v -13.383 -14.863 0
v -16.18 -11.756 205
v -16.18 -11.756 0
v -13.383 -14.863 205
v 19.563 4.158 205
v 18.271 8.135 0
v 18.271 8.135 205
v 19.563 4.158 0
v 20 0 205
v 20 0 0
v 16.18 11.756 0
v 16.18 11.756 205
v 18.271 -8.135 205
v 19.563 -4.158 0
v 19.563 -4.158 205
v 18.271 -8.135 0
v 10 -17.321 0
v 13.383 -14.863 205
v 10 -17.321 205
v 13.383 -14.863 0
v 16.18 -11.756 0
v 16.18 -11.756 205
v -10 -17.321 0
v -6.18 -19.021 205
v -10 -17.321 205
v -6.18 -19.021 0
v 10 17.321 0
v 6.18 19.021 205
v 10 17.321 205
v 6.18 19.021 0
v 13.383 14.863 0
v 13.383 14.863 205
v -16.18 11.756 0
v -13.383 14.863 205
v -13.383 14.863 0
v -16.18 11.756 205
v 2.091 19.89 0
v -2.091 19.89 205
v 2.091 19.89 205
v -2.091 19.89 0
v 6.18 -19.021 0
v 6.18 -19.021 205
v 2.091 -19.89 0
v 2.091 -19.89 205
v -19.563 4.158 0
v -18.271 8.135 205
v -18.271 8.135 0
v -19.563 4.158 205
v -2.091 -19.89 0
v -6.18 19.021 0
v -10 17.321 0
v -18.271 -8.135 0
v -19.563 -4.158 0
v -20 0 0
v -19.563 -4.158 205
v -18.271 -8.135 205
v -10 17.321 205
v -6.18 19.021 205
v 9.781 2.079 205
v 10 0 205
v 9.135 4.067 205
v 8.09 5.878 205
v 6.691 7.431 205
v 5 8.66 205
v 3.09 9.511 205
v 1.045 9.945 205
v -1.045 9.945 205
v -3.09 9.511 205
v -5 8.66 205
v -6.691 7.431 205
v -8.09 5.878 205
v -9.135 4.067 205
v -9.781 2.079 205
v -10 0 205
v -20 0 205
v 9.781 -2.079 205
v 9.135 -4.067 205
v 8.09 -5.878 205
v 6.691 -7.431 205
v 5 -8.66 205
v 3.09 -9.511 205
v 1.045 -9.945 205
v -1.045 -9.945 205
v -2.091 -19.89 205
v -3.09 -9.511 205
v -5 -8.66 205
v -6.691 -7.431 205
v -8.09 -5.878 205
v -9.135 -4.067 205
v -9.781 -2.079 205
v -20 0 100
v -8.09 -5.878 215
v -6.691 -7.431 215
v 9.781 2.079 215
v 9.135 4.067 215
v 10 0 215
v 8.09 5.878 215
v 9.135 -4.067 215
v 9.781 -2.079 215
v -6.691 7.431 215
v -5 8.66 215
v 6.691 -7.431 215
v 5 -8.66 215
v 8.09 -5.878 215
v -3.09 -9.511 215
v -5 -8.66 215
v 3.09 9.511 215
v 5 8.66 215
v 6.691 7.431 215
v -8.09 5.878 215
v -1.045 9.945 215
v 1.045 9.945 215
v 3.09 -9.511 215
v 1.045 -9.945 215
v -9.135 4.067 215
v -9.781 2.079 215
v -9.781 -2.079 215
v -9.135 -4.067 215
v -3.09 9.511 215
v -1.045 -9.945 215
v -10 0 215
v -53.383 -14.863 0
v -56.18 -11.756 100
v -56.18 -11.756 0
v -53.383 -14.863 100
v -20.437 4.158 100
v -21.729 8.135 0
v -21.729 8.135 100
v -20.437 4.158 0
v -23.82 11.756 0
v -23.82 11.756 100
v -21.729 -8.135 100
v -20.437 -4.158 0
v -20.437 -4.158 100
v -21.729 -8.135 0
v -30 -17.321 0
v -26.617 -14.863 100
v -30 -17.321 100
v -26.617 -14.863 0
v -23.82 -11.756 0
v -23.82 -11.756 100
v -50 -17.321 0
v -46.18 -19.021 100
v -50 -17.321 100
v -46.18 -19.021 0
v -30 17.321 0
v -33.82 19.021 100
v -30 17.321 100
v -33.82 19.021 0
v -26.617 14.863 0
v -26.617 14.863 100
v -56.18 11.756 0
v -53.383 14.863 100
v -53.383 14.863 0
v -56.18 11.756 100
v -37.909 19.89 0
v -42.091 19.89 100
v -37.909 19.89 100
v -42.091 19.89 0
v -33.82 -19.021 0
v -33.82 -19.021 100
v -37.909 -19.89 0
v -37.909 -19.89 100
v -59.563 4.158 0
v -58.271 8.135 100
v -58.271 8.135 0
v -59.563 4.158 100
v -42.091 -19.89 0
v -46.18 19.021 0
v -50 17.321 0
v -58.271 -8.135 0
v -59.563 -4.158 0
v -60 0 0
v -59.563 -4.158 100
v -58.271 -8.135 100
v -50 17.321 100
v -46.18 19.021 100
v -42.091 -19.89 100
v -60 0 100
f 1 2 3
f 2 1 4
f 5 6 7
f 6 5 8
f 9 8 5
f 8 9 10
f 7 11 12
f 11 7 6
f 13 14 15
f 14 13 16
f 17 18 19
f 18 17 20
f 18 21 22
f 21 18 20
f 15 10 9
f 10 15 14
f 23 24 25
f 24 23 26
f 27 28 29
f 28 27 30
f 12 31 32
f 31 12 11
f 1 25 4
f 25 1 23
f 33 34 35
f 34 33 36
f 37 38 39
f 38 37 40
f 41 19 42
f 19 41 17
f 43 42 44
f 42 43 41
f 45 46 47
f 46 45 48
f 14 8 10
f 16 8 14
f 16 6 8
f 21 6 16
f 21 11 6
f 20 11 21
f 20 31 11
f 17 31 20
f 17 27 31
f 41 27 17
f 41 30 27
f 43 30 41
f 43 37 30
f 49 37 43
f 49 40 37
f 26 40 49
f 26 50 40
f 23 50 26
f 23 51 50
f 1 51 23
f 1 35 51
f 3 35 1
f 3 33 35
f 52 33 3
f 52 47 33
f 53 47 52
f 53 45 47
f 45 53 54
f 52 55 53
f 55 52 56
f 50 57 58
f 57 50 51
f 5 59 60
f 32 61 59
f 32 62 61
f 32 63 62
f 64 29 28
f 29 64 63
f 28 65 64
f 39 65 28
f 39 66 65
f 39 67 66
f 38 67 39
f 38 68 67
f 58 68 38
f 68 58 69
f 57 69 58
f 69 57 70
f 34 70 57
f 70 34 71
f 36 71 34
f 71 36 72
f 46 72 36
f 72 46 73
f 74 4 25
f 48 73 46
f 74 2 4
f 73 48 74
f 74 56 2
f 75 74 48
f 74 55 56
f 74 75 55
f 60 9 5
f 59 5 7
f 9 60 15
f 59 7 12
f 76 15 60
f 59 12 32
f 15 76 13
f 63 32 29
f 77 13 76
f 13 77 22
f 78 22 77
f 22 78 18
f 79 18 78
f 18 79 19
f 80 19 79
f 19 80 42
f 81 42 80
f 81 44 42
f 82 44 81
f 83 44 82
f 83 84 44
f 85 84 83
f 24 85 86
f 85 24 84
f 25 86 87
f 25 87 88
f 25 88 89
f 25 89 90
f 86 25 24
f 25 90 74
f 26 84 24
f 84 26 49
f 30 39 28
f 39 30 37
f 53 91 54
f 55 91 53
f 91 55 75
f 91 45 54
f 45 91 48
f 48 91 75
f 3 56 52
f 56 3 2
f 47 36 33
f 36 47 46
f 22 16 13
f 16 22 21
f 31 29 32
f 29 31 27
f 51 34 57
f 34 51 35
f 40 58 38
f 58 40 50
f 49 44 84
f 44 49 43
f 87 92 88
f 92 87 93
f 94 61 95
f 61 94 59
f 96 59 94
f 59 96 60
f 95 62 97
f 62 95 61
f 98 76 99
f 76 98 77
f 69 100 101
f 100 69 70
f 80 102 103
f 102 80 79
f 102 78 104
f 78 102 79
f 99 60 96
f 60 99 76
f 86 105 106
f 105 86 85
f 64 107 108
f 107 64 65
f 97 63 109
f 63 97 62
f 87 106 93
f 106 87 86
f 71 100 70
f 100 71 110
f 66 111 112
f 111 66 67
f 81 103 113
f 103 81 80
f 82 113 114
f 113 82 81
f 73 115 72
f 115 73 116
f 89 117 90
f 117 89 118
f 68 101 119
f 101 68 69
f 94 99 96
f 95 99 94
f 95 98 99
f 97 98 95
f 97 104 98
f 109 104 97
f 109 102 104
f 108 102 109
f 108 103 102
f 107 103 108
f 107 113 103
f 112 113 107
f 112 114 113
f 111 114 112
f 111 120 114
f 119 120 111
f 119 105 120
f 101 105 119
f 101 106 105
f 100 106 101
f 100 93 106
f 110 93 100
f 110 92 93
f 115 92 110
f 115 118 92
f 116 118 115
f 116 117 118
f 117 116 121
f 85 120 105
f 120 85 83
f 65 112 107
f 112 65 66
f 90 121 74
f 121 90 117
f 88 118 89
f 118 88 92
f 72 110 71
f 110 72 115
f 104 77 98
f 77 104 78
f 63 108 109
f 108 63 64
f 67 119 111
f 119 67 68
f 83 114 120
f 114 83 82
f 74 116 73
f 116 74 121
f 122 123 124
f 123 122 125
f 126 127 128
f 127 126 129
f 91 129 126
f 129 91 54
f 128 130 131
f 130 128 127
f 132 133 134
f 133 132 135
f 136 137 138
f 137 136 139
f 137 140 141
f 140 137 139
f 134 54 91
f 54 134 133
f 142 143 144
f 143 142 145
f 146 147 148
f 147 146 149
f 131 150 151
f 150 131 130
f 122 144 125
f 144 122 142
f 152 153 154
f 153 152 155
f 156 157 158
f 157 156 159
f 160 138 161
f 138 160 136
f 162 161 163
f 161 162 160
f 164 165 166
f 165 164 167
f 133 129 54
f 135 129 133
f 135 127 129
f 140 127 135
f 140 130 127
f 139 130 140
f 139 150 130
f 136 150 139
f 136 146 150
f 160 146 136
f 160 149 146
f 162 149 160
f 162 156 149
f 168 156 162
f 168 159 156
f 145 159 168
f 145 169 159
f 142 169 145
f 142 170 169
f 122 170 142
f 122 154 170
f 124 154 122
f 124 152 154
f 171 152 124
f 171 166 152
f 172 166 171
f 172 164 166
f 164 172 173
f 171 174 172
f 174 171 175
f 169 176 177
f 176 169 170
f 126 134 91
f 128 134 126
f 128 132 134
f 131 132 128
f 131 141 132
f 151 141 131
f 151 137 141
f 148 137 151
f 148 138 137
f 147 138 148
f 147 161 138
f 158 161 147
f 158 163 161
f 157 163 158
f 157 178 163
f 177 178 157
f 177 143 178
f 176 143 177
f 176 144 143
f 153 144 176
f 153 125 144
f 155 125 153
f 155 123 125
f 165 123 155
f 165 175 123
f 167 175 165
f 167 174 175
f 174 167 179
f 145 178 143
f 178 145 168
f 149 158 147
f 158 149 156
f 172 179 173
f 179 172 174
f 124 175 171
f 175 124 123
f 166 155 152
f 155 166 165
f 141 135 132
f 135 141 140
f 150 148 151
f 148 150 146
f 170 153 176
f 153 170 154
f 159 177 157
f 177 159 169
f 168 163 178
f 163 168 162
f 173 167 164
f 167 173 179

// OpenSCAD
// file: utils.scad
// Author: Mihai Oltean, www.tcreate.org, mihai.oltean@gmail.com
// More details: jenny5.org
// Source: github.com/jenny5-robot
// MIT License
//--------------------------------------------------------------

module colt(radius, height)
{
	difference(){
		cube ([radius, radius, height]);
		cylinder	(h = height, r = radius, $fn = 30);
	}
}
/////////////////////////////////////////////////////////////////////////////////////////////////////////////////////////
module colt_sferic(radius)
{
	difference(){
		cube ([radius, radius, radius]);
		sphere(r = radius, $fn = 40);
	}
}
/////////////////////////////////////////////////////////////////////////////////////////////////////////////////////////
module coloana_sferica(height, radius)
{
		difference(){
			cube ([height, height, height]);
			cylinder(h= height, r = radius, $fn = 50);
		}
}
/////////////////////////////////////////////////////////////////////////////////////////////////////////////////////////
// file: params_pulleys.scad
// Author: Mihai Oltean, www.tcreate.org, mihai.oltean@gmail.com
// More details: jenny5.org
// Source: github.com/jenny5-robot
// MIT License
//--------------------------------------------------------------

pulley_40_radius = 19;
pulley_40_height = 16;

pulley_30_radius = 14;
pulley_30_height = 16;

pulley_18_radius = 7.2;
pulley_18_height = 14;


roata_cu_dinti_raza_flansa = 11.5;

roata_dintata_t2_5_30_dinti_height = 17;
roata_dintata_t2_5_30_dinti_raza_flansa = 14;
// file: config.scad
// Author: Mihai Oltean, www.tcreate.org, mihai.oltean@gmail.com
// More details: jenny5.org
// Source: github.com/jenny5-robot
// MIT License
//--------------------------------------------------------------

aluminium_color = "Silver";
screw_color = "LightSlateGray";
frame_color = aluminium_color;
shaft_color = "Silver";
plastic_color = "LimeGreen";
pulley_color = "DarkSlateGray";
// file: params_screws_nuts_washers.scad
// Author: Mihai Oltean, www.tcreate.org, mihai.oltean@gmail.com
// More details: jenny5.org
// Source: github.com/jenny5-robot
// MIT License
//--------------------------------------------------------------


m2_screw_radius = 1;
m2_nut_radius = 2.2;
m2_nut_height = 1.6;
m2_nut_thick = m2_nut_height;

m3_screw_radius = 1.5;
m3_nut_radius = 3.1;
m3_nut_height = 2.3;
m3_nut_thick = m3_nut_height;
m3_autolock_nut_thick = 4.2;

m4_screw_radius = 2;
m4_nut_radius = 4;
m4_auto_lock_nut_height = 5;
m4_nut_height = 3.25;
m4_nut_thick = 3.25;

m5_screw_radius = 2.5;
m5_nut_radius = 4.6;
m5_nut_height = 4;

m6_screw_radius = 3;
m6_nut_radius = 5.65;
m6_nut_thick = 5;
m6_nut_slim_thick = 3;
m6_autolock_nut_thick = 6;
m6_long_nut_thick = 9;

m8_screw_head_height = 5.7;
m8_screw_radius = 3.9;
m8_nut_small_width = 12.8;
m8_nut_radius = 7.3;
m8_slim_nut_small_width = 12.4;
m8_nut_thick = 6.5;
m8_nut_height = m8_nut_thick;
m8_slim_nut_height = 5.5;
m8_screw_head_radius = 6.5;
m8_autolock_nut_thick = 8;

m10_screw_radius = 5;
m10_nut_thick = 8;
m10_nut_radius = 9.8;

M12_screw_radius = 6;
M12_nut_thick = 8;
M12_nut_radius = 11;
M12_long_long_nut_thick = 36;
M12_long_nut_thick = 36;
M12_autolock_nut_thick = 14;

m10_long_nut_radius = 9.71;
m10_long_nut_height = 29.8;

m10_long_thick_nut_radius = 7.41;
m10_long_thick_nut_height = 30.4;

m12_plastic_nut_radius = 10.45;
m12_plastic_nut_height = 23.3;

tr12_3_nut_radius = 11;
tr12_3_nut_height = 18.1;

washer_5 = 0.97;

washer_4_12_radius = 6;
washer_4_12_external_radius = 6;
washer_4_12_thick = 1;
washer_4_thick = 1;
washer_4_12_internal_radius = 2.15;

washer_4_9_external_radius = 4.5;
washer_4_9_internal_radius = 2.15;
washer_4_9_thick = 1;

washer_6_thick = 1.7;
washer_8_thick = 1.5;
washer_5_thick = 1;

washer_10_height = 2;
washer_10_thick = 2;

washer_12_thick = 2;

washer_5_15_external_radius = 7.5;
washer_5_15_thick = 1;
washer_5_thick = 1;
washer_5_15_internal_radius = 2.65;
// file: params_basic_components.scad
// Author: Mihai Oltean, www.tcreate.org, mihai.oltean@gmail.com
// More details: jenny5.org
// Source: github.com/jenny5-robot
// MIT License
//--------------------------------------------------------------

spring_length = 20;

smooth_rod_8_radius = 4;
smooth_rod_10_radius = 5;
smooth_rod_12_radius = 6;

tolerance = 0.1;
display_tolerance = 1;

overlap_tolerance = 0.01;


wall_thick_1 = 1;
wall_thick_2 = 2;
wall_thick_3 = 3;
wall_thick_4 = 4;
wall_thick_5 = 5;
wall_thick_5_5 = 5.5;
wall_thick_6 = 6;
wall_thick_7 = 7;
wall_thick_8 = 8;
wall_thick_9 = 9;
wall_thick_10 = 10;
wall_thick_12 = 10;

wrench_radius = 11;

ghidaj_radius = 4;
ghidaj_radius_12 = 6;

canal_diameter = 8.22;
canal_height = 2.2;

filament_radius = 0.9;

bowden_tube_radius = 2.5;

m3_tolerance = 0.1;

latura_mare_L = 40;
latura_mica_L = 15;
grosime_perete_L = 3;

latura_L_50x50 = 50;
latura_L_40x40 = 40;

latura_U_50x50 = 50;
latura_U_40x40 = 40;


tolerance_z = [0, 0, tolerance];
tolerance_x = [tolerance, 0, 0];
tolerance_y = [0, tolerance, 0];

display_tolerance_z = [0, 0, display_tolerance];
display_tolerance_x = [display_tolerance, 0, 0];
display_tolerance_y = [0, display_tolerance, 0];

display_tolerance_xz = [display_tolerance, 0, display_tolerance];
display_tolerance_xy = [display_tolerance, display_tolerance, 0];
display_tolerance_yz = [0, display_tolerance, display_tolerance];

display_tolerance_xyz = [display_tolerance, display_tolerance, display_tolerance];
// file: stepper_motors.scad
// Author: Mihai Oltean, www.tcreate.org, mihai.oltean@gmail.com
// More details: jenny5.org
// Source: github.com/jenny5-robot
// MIT License
//--------------------------------------------------------------

use <basic_components.scad>
include <params_stepper_motors.scad>
include <params_basic_components.scad>
include <params_screws_nuts_washers.scad>

///////////////////////////////////////////////////////////////////////////////////////////////////////////////////////////////
module nema_motor(motor_width, motor_height, shaft_length = nema_17_shaft_length, shaft_radius = m5_screw_radius, top_cylinder_radius, top_cylinder_height = 2, nema_holes)
{

	latura_interioara = motor_width + 12;
	latura_exterioara = latura_interioara + 15;
	union (){
		difference(){
			union(){
				color("Gainsboro") translate ([-motor_width / 2, -motor_width / 2, 0]) cube([motor_width, motor_width, 10]);
				translate([0, 0, 10]) color("black")  translate ([-motor_width / 2, -motor_width / 2, 0]) cube([motor_width, motor_width, motor_height - 20]);
				translate([0, 0, motor_height - 10]) color("Gainsboro")  translate ([-motor_width / 2, -motor_width / 2, 0]) cube([motor_width, motor_width, 10]);
				translate([0, 0, motor_height])color("Gainsboro") cylinder_empty (top_cylinder_height, top_cylinder_radius, 5);
	// ax
			color("Silver")cylinder (h = motor_height + shaft_length, r = shaft_radius, $fn = 30); 

			}
            /*
			color("black")  translate ([motor_width / 2, motor_width / 2, 10] - display_tolerance_z) 
rotate ([0, 0, 45]) translate ([- latura_exterioara / 2, -latura_exterioara / 2, 0]) cube_empty(latura_interioara - 3, latura_exterioara, motor_height - 20 + 2 * display_tolerance);
			color("Gainsboro")  translate ([motor_width / 2, motor_width / 2, 0] - display_tolerance_z) 
rotate ([0, 0, 45]) translate ([- latura_exterioara / 2, -latura_exterioara / 2, 0]) cube_empty(latura_interioara, latura_exterioara, 10 + display_tolerance);
			color("Gainsboro")  translate ([motor_width / 2, motor_width / 2, motor_height - 10]) 
rotate ([0, 0, 45]) translate ([- latura_exterioara / 2, -latura_exterioara / 2, 0]) cube_empty(latura_interioara, latura_exterioara, 10 + display_tolerance);
            */
		// gauri baza
			  for (i=[1:4])
                translate (nema_holes[i]) cylinder (r = m5_screw_radius, h = 5, $fn = 20); 
		// gauri m3 top
			// translate ([-motor_width / 2, -motor_width / 2, 0]) translate ([0, 0, motor_height]) gauri_nema17(3, m3_screw_radius);
            for (i=[1:4])
                translate (nema_holes[i] + [0, 0, motor_height - 4]) cylinder (r = m3_screw_radius, h = 5, $fn = 10); 
		// gaura ax jos
			color("Silver") translate (- display_tolerance_z) cylinder (h = 3, r = 5, $fn = 30); 
		// taie axul
			translate ([motor_width / 2 + 2, motor_width / 2 - 2, motor_height]) cube ([2, 4, shaft_length]);
		}
			// cables
		translate ([-3, motor_width / 2 + 10, 3]) rotate([90, 0, 0]) color("Red") cylinder (h= 10, r = 0.5);
		translate ([-1, motor_width / 2 + 10, 3]) rotate([90, 0, 0]) color("Black") cylinder (h= 10, r = 0.5);
		translate ([1, motor_width / 2 + 10, 3]) rotate([90, 0, 0]) color("Blue") cylinder (h= 10, r = 0.5);
		translate ([3, motor_width / 2 + 10, 3]) rotate([90, 0, 0]) color("Green") cylinder (h= 10, r = 0.5);
	}
}
///////////////////////////////////////////////////////////////////////////////////////////////////////////////////////////////
module nema_motor_with_gearbox(motor_width, motor_height, gearbox_length, gearbox_radius, gearbox_base_height, gearbox_screw_holes_position, gearbox_shaft_length, gearbox_shaft_radius)
{
	nema_motor(motor_width, motor_height);
    // gearbox base
    if (gearbox_base_height > 0)
        color ("gray") translate ([-motor_width / 2, -motor_width / 2, motor_height]) cube([motor_width, motor_width, gearbox_base_height]);
// gearbox
	difference(){
        color ("gray") translate ([0, 0, motor_height + gearbox_base_height]) cylinder ( h =  gearbox_length, r = gearbox_radius, $fn = 50);
// gearbox holes
        for (i=[0:4])
    translate ([0, 0, motor_height + gearbox_length + gearbox_base_height - 3] + gearbox_screw_holes_position[i]) cylinder (h = 4, r = m3_screw_radius, $fn = 20);
	}
// gearbox shaft
	color("black") translate ([0, 0, motor_height + gearbox_length + gearbox_base_height]) cylinder ( h =  gearbox_shaft_length, r = gearbox_shaft_radius, $fn = 30);

}
///////////////////////////////////////////////////////////////////////////////////////////////////////////////////////////////
module nema_17()
{
	nema_motor(nema_17_42BYGHW804_width, nema_17_42BYGHW804_height, nema_17_42BYGHW804_shaft_length, nema_17_42BYGHW804_shaft_radius, nema_17_42BYGHW804_top_radius, nema_17_42BYGHW804_top_cylinder_height, gauri_nema_17);
}
///////////////////////////////////////////////////////////////////////////////////////////////////////////////////////////////
module nema_14_39BYGL215A()
{
	nema_motor(nema_14_39BYGL215A_width, nema_14_39BYGL215A_height, nema_14_39BYGL215A_shaft_length, nema_14_39BYGL215A_shaft_radius, nema_14_39BYGL215A_top_radius, nema_14_39BYGL215A_top_cylinder_height, nema_14_39BYGL215A_screw_hole_position);
}
///////////////////////////////////////////////////////////////////////////////////////////////////////////////////////////////
module nema_17_42BYGHW804()
{
	nema_motor(nema_17_42BYGHW804_width, nema_17_42BYGHW804_height, nema_17_42BYGHW804_shaft_length, nema_17_42BYGHW804_shaft_radius, nema_17_42BYGHW804_top_radius, nema_17_42BYGHW804_top_cylinder_height, gauri_nema_17);
}
///////////////////////////////////////////////////////////////////////////////////////////////////////////////////////////////
module nema_23_57BYGH603()
{
	nema_motor(nema_23_57BYGH603_width, nema_23_57BYGH603_height, nema_23_57BYGH603_shaft_length);
}
///////////////////////////////////////////////////////////////////////////////////////////////////////////////////////////////
module nema_17_with_screw()
{
	nema_motor(nema_17_width, nema_17_height, 200, 4);
}
///////////////////////////////////////////////////////////////////////////////////////////////////////////////////////////////
module nema_11()
{
	nema_motor(nema_11_width, nema_11_height);
}
////////////////////////////////////////////////////////////////////////////////////////////////////////////////////////////////
module nema_11_with_27_1_gearbox()
{
	nema_motor_with_gearbox(nema_11_width, nema_11_height, nema_11_27_1_gearbox_length, nema_11_motor_gearbox_radius, 0, gearbox_nema_11_holes_position, nema_11_gearbox_shaft_length, 3);
}
///////////////////////////////////////////////////////////////////////////////////////////////////////////////////////////////
module nema_11_with_13_1_gearbox()
{
	nema_motor_with_gearbox(nema_11_width, nema_11_height, nema_11_13_1_gearbox_length, nema_11_motor_gearbox_radius, 0, gearbox_nema_11_holes_position, nema_11_gearbox_shaft_length, 3);
}
///////////////////////////////////////////////////////////////////////////////////////////////////////////////////////////////
module nema_17_with_5_1_gearbox()
{
	nema_motor_with_gearbox(nema_17_width, nema_17_height, nema_17_5_1_gearbox_height, nema_17_motor_gearbox_radius, nema_17_gearbox_base_height, gearbox_nema_17_holes_position, nema_17_shaft_length, nema_17_gearbox_shaft_radius);
}
///////////////////////////////////////////////////////////////////////////////////////////////////////////////////////////////
module nema_17_with_13_1_gearbox()
{
	nema_motor_with_gearbox(nema_17_width, nema_17_height, nema_17_13_1_gearbox_height, nema_17_motor_gearbox_radius, nema_17_gearbox_base_height, gearbox_nema_17_holes_position, nema_17_shaft_length, nema_17_gearbox_shaft_radius);
}
///////////////////////////////////////////////////////////////////////////////////////////////////////////////////////////////
module nema_17_with_13_1_gearbox_and_screw(gearbox_shaft_length = 100)
{
    nema_17_with_13_1_gearbox();
    //conector 
        color ("gray") translate ([0, 0, nema_17_height + nema_17_gearbox_base_height + nema_17_13_1_gearbox_height]) cylinder (h = 25, r = 6);
    // screw
    color ("gray") translate ([0, 0, nema_17_height + nema_17_gearbox_base_height + nema_17_13_1_gearbox_height + nema_17_gearbox_shaft_length]) cylinder (h = gearbox_shaft_length, r = 4);
}
///////////////////////////////////////////////////////////////////////////////////////////////////////////////////////////////
//nema_17();

//nema_17_42BYGHW804();

nema_11_with_27_1_gearbox();

//nema_17_with_5_1_gearbox();

//nema_17_with_13_1_gearbox_and_screw();
// file: params_stepper_motors.scad
// Author: Mihai Oltean, www.tcreate.org, mihai.oltean@gmail.com
// More details: jenny5.org
// Source: github.com/jenny5-robot
// MIT License
//--------------------------------------------------------------

nema_17_width = 42.3;
nema_17_motor_height_sparkfun = 36;
nema_17_motor_hole_radius_sparkfun  = 14;
nema_17_motor_hole_radius_camiel  = 12;
nema_17_dist_between_screw_holes = 31;
nema_17_height = 47;
nema_17_shaft_length = 24;

nema_14_width = 39.3;
nema_14_motor_hole_radius  = 11;
nema_14_dist_between_screw_holes = 31;
nema_14_height = 47;
nema_14_shaft_length = 20;

nema_11_width = 28;
nema_11_motor_hole_radius = 11;
nema_11_dist_between_screw_holes = 23;
nema_11_height = 32;
nema_11_shaft_length = 18;
nema_11_shaft_radius = 3;

nema_11_27_1_gearbox_length = 34;
nema_11_13_1_gearbox_length = 25;
nema_11_gearbox_base_height = 4;
nema_11_motor_gearbox_radius = 14;
nema_11_motor_gearbox_hole_radius = 9;
nema_11_gearbox_dist_between_screw_holes = 22 / sqrt(2);
nema_11_gearbox_shaft_length = 18;

nema_11_with_27_1_gearbox_height = nema_11_height + nema_11_gearbox_base_height + nema_11_27_1_gearbox_length;
nema_11_with_13_1_gearbox_height = nema_11_height + nema_11_gearbox_base_height + nema_11_13_1_gearbox_length;

nema_17_motor_gearbox_radius = 18;
nema_17_gearbox_dist_between_screw_holes = 20;
nema_17_5_1_gearbox_height = 23;
nema_17_13_1_gearbox_height = 30;

nema_17_gearbox_base_height = 5;
nema_17_gearbox_shaft_length = 18;
nema_17_gearbox_shaft_radius = 4;
nema_17_gearbox_motor_hole_radius = 11;

nema_17_with_5_1_gearbox_height = nema_17_height + nema_17_gearbox_base_height + nema_17_5_1_gearbox_height;
nema_17_with_13_1_gearbox_height = nema_17_height + nema_17_gearbox_base_height + nema_17_13_1_gearbox_height;

nema_17_42BYGHW804_width = 42.3;
nema_17_42BYGHW804_height = 47;
nema_17_42BYGHW804_top_radius = 11;
nema_17_42BYGHW804_top_cylinder_height = 2;
nema_17_42BYGHW804_dist_between_screw_holes = 31;
nema_17_42BYGHW804_shaft_length = 22;
nema_17_42BYGHW804_shaft_radius = 2.5;

nema_23_57BYGH603_width = 56.4;
nema_23_57BYGH603_height = 78;
nema_23_57BYGH603_hole_radius  = 19.1;
nema_23_57BYGH603_dist_between_screw_holes = 47.14;
nema_23_57BYGH603_shaft_length = 21;

nema_14_39BYGL215A_width = 39;
nema_14_39BYGL215A_height = 34;
nema_14_39BYGL215A_top_radius = 11;
nema_14_39BYGL215A_dist_between_screw_holes = 31;
nema_14_39BYGL215A_shaft_length = 50;
nema_14_39BYGL215A_shaft_radius = 2.5;
nema_14_39BYGL215A_top_cylinder_height = 2;


nema_11_sizes = [nema_11_width, nema_11_width, nema_11_height];

gauri_nema_17 = [
[0, 0, 0], 
[-nema_17_dist_between_screw_holes / 2, -nema_17_dist_between_screw_holes / 2, 0], 
[-nema_17_dist_between_screw_holes / 2, nema_17_dist_between_screw_holes / 2, 0], 
[nema_17_dist_between_screw_holes / 2, -nema_17_dist_between_screw_holes / 2, 0], 
[nema_17_dist_between_screw_holes / 2, nema_17_dist_between_screw_holes / 2, 0]
];

nema_14_39BYGL215A_screw_hole_position = [
[0, 0, 0], 
[-nema_14_39BYGL215A_dist_between_screw_holes / 2, -nema_14_39BYGL215A_dist_between_screw_holes / 2, 0], 
[-nema_14_39BYGL215A_dist_between_screw_holes / 2, nema_14_39BYGL215A_dist_between_screw_holes / 2, 0], 
[nema_14_39BYGL215A_dist_between_screw_holes / 2, -nema_14_39BYGL215A_dist_between_screw_holes / 2, 0], 
[nema_14_39BYGL215A_dist_between_screw_holes / 2, nema_14_39BYGL215A_dist_between_screw_holes / 2, 0]
];


gauri_nema_11 = [
[0, 0, 0], 
[-nema_11_dist_between_screw_holes / 2, -nema_11_dist_between_screw_holes / 2, 0], 
[-nema_11_dist_between_screw_holes / 2, nema_11_dist_between_screw_holes / 2, 0], 
[nema_11_dist_between_screw_holes / 2, -nema_11_dist_between_screw_holes / 2, 0], 
[nema_11_dist_between_screw_holes / 2, nema_11_dist_between_screw_holes / 2, 0]
];

gearbox_nema_11_holes_position = [[0, 0, 0], 
[-nema_11_gearbox_dist_between_screw_holes / 2, -nema_11_gearbox_dist_between_screw_holes / 2, 0], [-nema_11_gearbox_dist_between_screw_holes / 2, nema_11_gearbox_dist_between_screw_holes / 2, 0], [nema_11_gearbox_dist_between_screw_holes / 2, -nema_11_gearbox_dist_between_screw_holes / 2, 0], [nema_11_gearbox_dist_between_screw_holes / 2, nema_11_gearbox_dist_between_screw_holes / 2, 0]];

gearbox_nema_17_holes_position = [
[0, 0, 0], 
[-nema_17_gearbox_dist_between_screw_holes / 2, -nema_17_gearbox_dist_between_screw_holes / 2, 0], 
[-nema_17_gearbox_dist_between_screw_holes / 2, nema_17_gearbox_dist_between_screw_holes / 2, 0], 
[nema_17_gearbox_dist_between_screw_holes / 2, -nema_17_gearbox_dist_between_screw_holes / 2, 0], 
[nema_17_gearbox_dist_between_screw_holes / 2, nema_17_gearbox_dist_between_screw_holes / 2, 0]
];
// main file
// Author: Mihai Oltean, www.tcreate.org, mihai.oltean@gmail.com
// More details: jenny5.org
// Source: github.com/jenny5-robot
// MIT License
//--------------------------------------------------------------

include <params_stepper_motors.scad>

use <stepper_motors.scad>
use <pulleys.scad>


//------------------------------------------------------

module linear_stepper_motor()
{
    cylinder (h = 250, r = 4, $fn = 20);
    translate([40, 0, nema_17_with_gearbox_height + nema_17_gearbox_shaft_length]) mirror([0, 0, 1]) nema_17_with_gearbox();
    // sheet
    translate ([-20, -20, nema_17_gearbox_shaft_length - 3]) cube([80, 40, 3]);
    
    // pulleys
    my_pulley(24, 30, 0, 0, 0);
    
    translate([40, 0, 0]) my_pulley(24, 30, 0, 0, 0);
}
//------------------------------------------------------
module linear_dc_motor(stroke, current_pos)
{
    base_length = 105 + stroke;
    // tube
    color("grey") cylinder (h = base_length, r = 20);
    // pusher
    color("grey") translate([0, 0, base_length]) cylinder (h = current_pos, r = 10);
    
    // motor
    color("grey") translate ([-40, 0, 0]) cylinder(h = 100, r = 20);
}
//------------------------------------------------------

//linear_stepper_motor();

linear_dc_motor(100, 10);
